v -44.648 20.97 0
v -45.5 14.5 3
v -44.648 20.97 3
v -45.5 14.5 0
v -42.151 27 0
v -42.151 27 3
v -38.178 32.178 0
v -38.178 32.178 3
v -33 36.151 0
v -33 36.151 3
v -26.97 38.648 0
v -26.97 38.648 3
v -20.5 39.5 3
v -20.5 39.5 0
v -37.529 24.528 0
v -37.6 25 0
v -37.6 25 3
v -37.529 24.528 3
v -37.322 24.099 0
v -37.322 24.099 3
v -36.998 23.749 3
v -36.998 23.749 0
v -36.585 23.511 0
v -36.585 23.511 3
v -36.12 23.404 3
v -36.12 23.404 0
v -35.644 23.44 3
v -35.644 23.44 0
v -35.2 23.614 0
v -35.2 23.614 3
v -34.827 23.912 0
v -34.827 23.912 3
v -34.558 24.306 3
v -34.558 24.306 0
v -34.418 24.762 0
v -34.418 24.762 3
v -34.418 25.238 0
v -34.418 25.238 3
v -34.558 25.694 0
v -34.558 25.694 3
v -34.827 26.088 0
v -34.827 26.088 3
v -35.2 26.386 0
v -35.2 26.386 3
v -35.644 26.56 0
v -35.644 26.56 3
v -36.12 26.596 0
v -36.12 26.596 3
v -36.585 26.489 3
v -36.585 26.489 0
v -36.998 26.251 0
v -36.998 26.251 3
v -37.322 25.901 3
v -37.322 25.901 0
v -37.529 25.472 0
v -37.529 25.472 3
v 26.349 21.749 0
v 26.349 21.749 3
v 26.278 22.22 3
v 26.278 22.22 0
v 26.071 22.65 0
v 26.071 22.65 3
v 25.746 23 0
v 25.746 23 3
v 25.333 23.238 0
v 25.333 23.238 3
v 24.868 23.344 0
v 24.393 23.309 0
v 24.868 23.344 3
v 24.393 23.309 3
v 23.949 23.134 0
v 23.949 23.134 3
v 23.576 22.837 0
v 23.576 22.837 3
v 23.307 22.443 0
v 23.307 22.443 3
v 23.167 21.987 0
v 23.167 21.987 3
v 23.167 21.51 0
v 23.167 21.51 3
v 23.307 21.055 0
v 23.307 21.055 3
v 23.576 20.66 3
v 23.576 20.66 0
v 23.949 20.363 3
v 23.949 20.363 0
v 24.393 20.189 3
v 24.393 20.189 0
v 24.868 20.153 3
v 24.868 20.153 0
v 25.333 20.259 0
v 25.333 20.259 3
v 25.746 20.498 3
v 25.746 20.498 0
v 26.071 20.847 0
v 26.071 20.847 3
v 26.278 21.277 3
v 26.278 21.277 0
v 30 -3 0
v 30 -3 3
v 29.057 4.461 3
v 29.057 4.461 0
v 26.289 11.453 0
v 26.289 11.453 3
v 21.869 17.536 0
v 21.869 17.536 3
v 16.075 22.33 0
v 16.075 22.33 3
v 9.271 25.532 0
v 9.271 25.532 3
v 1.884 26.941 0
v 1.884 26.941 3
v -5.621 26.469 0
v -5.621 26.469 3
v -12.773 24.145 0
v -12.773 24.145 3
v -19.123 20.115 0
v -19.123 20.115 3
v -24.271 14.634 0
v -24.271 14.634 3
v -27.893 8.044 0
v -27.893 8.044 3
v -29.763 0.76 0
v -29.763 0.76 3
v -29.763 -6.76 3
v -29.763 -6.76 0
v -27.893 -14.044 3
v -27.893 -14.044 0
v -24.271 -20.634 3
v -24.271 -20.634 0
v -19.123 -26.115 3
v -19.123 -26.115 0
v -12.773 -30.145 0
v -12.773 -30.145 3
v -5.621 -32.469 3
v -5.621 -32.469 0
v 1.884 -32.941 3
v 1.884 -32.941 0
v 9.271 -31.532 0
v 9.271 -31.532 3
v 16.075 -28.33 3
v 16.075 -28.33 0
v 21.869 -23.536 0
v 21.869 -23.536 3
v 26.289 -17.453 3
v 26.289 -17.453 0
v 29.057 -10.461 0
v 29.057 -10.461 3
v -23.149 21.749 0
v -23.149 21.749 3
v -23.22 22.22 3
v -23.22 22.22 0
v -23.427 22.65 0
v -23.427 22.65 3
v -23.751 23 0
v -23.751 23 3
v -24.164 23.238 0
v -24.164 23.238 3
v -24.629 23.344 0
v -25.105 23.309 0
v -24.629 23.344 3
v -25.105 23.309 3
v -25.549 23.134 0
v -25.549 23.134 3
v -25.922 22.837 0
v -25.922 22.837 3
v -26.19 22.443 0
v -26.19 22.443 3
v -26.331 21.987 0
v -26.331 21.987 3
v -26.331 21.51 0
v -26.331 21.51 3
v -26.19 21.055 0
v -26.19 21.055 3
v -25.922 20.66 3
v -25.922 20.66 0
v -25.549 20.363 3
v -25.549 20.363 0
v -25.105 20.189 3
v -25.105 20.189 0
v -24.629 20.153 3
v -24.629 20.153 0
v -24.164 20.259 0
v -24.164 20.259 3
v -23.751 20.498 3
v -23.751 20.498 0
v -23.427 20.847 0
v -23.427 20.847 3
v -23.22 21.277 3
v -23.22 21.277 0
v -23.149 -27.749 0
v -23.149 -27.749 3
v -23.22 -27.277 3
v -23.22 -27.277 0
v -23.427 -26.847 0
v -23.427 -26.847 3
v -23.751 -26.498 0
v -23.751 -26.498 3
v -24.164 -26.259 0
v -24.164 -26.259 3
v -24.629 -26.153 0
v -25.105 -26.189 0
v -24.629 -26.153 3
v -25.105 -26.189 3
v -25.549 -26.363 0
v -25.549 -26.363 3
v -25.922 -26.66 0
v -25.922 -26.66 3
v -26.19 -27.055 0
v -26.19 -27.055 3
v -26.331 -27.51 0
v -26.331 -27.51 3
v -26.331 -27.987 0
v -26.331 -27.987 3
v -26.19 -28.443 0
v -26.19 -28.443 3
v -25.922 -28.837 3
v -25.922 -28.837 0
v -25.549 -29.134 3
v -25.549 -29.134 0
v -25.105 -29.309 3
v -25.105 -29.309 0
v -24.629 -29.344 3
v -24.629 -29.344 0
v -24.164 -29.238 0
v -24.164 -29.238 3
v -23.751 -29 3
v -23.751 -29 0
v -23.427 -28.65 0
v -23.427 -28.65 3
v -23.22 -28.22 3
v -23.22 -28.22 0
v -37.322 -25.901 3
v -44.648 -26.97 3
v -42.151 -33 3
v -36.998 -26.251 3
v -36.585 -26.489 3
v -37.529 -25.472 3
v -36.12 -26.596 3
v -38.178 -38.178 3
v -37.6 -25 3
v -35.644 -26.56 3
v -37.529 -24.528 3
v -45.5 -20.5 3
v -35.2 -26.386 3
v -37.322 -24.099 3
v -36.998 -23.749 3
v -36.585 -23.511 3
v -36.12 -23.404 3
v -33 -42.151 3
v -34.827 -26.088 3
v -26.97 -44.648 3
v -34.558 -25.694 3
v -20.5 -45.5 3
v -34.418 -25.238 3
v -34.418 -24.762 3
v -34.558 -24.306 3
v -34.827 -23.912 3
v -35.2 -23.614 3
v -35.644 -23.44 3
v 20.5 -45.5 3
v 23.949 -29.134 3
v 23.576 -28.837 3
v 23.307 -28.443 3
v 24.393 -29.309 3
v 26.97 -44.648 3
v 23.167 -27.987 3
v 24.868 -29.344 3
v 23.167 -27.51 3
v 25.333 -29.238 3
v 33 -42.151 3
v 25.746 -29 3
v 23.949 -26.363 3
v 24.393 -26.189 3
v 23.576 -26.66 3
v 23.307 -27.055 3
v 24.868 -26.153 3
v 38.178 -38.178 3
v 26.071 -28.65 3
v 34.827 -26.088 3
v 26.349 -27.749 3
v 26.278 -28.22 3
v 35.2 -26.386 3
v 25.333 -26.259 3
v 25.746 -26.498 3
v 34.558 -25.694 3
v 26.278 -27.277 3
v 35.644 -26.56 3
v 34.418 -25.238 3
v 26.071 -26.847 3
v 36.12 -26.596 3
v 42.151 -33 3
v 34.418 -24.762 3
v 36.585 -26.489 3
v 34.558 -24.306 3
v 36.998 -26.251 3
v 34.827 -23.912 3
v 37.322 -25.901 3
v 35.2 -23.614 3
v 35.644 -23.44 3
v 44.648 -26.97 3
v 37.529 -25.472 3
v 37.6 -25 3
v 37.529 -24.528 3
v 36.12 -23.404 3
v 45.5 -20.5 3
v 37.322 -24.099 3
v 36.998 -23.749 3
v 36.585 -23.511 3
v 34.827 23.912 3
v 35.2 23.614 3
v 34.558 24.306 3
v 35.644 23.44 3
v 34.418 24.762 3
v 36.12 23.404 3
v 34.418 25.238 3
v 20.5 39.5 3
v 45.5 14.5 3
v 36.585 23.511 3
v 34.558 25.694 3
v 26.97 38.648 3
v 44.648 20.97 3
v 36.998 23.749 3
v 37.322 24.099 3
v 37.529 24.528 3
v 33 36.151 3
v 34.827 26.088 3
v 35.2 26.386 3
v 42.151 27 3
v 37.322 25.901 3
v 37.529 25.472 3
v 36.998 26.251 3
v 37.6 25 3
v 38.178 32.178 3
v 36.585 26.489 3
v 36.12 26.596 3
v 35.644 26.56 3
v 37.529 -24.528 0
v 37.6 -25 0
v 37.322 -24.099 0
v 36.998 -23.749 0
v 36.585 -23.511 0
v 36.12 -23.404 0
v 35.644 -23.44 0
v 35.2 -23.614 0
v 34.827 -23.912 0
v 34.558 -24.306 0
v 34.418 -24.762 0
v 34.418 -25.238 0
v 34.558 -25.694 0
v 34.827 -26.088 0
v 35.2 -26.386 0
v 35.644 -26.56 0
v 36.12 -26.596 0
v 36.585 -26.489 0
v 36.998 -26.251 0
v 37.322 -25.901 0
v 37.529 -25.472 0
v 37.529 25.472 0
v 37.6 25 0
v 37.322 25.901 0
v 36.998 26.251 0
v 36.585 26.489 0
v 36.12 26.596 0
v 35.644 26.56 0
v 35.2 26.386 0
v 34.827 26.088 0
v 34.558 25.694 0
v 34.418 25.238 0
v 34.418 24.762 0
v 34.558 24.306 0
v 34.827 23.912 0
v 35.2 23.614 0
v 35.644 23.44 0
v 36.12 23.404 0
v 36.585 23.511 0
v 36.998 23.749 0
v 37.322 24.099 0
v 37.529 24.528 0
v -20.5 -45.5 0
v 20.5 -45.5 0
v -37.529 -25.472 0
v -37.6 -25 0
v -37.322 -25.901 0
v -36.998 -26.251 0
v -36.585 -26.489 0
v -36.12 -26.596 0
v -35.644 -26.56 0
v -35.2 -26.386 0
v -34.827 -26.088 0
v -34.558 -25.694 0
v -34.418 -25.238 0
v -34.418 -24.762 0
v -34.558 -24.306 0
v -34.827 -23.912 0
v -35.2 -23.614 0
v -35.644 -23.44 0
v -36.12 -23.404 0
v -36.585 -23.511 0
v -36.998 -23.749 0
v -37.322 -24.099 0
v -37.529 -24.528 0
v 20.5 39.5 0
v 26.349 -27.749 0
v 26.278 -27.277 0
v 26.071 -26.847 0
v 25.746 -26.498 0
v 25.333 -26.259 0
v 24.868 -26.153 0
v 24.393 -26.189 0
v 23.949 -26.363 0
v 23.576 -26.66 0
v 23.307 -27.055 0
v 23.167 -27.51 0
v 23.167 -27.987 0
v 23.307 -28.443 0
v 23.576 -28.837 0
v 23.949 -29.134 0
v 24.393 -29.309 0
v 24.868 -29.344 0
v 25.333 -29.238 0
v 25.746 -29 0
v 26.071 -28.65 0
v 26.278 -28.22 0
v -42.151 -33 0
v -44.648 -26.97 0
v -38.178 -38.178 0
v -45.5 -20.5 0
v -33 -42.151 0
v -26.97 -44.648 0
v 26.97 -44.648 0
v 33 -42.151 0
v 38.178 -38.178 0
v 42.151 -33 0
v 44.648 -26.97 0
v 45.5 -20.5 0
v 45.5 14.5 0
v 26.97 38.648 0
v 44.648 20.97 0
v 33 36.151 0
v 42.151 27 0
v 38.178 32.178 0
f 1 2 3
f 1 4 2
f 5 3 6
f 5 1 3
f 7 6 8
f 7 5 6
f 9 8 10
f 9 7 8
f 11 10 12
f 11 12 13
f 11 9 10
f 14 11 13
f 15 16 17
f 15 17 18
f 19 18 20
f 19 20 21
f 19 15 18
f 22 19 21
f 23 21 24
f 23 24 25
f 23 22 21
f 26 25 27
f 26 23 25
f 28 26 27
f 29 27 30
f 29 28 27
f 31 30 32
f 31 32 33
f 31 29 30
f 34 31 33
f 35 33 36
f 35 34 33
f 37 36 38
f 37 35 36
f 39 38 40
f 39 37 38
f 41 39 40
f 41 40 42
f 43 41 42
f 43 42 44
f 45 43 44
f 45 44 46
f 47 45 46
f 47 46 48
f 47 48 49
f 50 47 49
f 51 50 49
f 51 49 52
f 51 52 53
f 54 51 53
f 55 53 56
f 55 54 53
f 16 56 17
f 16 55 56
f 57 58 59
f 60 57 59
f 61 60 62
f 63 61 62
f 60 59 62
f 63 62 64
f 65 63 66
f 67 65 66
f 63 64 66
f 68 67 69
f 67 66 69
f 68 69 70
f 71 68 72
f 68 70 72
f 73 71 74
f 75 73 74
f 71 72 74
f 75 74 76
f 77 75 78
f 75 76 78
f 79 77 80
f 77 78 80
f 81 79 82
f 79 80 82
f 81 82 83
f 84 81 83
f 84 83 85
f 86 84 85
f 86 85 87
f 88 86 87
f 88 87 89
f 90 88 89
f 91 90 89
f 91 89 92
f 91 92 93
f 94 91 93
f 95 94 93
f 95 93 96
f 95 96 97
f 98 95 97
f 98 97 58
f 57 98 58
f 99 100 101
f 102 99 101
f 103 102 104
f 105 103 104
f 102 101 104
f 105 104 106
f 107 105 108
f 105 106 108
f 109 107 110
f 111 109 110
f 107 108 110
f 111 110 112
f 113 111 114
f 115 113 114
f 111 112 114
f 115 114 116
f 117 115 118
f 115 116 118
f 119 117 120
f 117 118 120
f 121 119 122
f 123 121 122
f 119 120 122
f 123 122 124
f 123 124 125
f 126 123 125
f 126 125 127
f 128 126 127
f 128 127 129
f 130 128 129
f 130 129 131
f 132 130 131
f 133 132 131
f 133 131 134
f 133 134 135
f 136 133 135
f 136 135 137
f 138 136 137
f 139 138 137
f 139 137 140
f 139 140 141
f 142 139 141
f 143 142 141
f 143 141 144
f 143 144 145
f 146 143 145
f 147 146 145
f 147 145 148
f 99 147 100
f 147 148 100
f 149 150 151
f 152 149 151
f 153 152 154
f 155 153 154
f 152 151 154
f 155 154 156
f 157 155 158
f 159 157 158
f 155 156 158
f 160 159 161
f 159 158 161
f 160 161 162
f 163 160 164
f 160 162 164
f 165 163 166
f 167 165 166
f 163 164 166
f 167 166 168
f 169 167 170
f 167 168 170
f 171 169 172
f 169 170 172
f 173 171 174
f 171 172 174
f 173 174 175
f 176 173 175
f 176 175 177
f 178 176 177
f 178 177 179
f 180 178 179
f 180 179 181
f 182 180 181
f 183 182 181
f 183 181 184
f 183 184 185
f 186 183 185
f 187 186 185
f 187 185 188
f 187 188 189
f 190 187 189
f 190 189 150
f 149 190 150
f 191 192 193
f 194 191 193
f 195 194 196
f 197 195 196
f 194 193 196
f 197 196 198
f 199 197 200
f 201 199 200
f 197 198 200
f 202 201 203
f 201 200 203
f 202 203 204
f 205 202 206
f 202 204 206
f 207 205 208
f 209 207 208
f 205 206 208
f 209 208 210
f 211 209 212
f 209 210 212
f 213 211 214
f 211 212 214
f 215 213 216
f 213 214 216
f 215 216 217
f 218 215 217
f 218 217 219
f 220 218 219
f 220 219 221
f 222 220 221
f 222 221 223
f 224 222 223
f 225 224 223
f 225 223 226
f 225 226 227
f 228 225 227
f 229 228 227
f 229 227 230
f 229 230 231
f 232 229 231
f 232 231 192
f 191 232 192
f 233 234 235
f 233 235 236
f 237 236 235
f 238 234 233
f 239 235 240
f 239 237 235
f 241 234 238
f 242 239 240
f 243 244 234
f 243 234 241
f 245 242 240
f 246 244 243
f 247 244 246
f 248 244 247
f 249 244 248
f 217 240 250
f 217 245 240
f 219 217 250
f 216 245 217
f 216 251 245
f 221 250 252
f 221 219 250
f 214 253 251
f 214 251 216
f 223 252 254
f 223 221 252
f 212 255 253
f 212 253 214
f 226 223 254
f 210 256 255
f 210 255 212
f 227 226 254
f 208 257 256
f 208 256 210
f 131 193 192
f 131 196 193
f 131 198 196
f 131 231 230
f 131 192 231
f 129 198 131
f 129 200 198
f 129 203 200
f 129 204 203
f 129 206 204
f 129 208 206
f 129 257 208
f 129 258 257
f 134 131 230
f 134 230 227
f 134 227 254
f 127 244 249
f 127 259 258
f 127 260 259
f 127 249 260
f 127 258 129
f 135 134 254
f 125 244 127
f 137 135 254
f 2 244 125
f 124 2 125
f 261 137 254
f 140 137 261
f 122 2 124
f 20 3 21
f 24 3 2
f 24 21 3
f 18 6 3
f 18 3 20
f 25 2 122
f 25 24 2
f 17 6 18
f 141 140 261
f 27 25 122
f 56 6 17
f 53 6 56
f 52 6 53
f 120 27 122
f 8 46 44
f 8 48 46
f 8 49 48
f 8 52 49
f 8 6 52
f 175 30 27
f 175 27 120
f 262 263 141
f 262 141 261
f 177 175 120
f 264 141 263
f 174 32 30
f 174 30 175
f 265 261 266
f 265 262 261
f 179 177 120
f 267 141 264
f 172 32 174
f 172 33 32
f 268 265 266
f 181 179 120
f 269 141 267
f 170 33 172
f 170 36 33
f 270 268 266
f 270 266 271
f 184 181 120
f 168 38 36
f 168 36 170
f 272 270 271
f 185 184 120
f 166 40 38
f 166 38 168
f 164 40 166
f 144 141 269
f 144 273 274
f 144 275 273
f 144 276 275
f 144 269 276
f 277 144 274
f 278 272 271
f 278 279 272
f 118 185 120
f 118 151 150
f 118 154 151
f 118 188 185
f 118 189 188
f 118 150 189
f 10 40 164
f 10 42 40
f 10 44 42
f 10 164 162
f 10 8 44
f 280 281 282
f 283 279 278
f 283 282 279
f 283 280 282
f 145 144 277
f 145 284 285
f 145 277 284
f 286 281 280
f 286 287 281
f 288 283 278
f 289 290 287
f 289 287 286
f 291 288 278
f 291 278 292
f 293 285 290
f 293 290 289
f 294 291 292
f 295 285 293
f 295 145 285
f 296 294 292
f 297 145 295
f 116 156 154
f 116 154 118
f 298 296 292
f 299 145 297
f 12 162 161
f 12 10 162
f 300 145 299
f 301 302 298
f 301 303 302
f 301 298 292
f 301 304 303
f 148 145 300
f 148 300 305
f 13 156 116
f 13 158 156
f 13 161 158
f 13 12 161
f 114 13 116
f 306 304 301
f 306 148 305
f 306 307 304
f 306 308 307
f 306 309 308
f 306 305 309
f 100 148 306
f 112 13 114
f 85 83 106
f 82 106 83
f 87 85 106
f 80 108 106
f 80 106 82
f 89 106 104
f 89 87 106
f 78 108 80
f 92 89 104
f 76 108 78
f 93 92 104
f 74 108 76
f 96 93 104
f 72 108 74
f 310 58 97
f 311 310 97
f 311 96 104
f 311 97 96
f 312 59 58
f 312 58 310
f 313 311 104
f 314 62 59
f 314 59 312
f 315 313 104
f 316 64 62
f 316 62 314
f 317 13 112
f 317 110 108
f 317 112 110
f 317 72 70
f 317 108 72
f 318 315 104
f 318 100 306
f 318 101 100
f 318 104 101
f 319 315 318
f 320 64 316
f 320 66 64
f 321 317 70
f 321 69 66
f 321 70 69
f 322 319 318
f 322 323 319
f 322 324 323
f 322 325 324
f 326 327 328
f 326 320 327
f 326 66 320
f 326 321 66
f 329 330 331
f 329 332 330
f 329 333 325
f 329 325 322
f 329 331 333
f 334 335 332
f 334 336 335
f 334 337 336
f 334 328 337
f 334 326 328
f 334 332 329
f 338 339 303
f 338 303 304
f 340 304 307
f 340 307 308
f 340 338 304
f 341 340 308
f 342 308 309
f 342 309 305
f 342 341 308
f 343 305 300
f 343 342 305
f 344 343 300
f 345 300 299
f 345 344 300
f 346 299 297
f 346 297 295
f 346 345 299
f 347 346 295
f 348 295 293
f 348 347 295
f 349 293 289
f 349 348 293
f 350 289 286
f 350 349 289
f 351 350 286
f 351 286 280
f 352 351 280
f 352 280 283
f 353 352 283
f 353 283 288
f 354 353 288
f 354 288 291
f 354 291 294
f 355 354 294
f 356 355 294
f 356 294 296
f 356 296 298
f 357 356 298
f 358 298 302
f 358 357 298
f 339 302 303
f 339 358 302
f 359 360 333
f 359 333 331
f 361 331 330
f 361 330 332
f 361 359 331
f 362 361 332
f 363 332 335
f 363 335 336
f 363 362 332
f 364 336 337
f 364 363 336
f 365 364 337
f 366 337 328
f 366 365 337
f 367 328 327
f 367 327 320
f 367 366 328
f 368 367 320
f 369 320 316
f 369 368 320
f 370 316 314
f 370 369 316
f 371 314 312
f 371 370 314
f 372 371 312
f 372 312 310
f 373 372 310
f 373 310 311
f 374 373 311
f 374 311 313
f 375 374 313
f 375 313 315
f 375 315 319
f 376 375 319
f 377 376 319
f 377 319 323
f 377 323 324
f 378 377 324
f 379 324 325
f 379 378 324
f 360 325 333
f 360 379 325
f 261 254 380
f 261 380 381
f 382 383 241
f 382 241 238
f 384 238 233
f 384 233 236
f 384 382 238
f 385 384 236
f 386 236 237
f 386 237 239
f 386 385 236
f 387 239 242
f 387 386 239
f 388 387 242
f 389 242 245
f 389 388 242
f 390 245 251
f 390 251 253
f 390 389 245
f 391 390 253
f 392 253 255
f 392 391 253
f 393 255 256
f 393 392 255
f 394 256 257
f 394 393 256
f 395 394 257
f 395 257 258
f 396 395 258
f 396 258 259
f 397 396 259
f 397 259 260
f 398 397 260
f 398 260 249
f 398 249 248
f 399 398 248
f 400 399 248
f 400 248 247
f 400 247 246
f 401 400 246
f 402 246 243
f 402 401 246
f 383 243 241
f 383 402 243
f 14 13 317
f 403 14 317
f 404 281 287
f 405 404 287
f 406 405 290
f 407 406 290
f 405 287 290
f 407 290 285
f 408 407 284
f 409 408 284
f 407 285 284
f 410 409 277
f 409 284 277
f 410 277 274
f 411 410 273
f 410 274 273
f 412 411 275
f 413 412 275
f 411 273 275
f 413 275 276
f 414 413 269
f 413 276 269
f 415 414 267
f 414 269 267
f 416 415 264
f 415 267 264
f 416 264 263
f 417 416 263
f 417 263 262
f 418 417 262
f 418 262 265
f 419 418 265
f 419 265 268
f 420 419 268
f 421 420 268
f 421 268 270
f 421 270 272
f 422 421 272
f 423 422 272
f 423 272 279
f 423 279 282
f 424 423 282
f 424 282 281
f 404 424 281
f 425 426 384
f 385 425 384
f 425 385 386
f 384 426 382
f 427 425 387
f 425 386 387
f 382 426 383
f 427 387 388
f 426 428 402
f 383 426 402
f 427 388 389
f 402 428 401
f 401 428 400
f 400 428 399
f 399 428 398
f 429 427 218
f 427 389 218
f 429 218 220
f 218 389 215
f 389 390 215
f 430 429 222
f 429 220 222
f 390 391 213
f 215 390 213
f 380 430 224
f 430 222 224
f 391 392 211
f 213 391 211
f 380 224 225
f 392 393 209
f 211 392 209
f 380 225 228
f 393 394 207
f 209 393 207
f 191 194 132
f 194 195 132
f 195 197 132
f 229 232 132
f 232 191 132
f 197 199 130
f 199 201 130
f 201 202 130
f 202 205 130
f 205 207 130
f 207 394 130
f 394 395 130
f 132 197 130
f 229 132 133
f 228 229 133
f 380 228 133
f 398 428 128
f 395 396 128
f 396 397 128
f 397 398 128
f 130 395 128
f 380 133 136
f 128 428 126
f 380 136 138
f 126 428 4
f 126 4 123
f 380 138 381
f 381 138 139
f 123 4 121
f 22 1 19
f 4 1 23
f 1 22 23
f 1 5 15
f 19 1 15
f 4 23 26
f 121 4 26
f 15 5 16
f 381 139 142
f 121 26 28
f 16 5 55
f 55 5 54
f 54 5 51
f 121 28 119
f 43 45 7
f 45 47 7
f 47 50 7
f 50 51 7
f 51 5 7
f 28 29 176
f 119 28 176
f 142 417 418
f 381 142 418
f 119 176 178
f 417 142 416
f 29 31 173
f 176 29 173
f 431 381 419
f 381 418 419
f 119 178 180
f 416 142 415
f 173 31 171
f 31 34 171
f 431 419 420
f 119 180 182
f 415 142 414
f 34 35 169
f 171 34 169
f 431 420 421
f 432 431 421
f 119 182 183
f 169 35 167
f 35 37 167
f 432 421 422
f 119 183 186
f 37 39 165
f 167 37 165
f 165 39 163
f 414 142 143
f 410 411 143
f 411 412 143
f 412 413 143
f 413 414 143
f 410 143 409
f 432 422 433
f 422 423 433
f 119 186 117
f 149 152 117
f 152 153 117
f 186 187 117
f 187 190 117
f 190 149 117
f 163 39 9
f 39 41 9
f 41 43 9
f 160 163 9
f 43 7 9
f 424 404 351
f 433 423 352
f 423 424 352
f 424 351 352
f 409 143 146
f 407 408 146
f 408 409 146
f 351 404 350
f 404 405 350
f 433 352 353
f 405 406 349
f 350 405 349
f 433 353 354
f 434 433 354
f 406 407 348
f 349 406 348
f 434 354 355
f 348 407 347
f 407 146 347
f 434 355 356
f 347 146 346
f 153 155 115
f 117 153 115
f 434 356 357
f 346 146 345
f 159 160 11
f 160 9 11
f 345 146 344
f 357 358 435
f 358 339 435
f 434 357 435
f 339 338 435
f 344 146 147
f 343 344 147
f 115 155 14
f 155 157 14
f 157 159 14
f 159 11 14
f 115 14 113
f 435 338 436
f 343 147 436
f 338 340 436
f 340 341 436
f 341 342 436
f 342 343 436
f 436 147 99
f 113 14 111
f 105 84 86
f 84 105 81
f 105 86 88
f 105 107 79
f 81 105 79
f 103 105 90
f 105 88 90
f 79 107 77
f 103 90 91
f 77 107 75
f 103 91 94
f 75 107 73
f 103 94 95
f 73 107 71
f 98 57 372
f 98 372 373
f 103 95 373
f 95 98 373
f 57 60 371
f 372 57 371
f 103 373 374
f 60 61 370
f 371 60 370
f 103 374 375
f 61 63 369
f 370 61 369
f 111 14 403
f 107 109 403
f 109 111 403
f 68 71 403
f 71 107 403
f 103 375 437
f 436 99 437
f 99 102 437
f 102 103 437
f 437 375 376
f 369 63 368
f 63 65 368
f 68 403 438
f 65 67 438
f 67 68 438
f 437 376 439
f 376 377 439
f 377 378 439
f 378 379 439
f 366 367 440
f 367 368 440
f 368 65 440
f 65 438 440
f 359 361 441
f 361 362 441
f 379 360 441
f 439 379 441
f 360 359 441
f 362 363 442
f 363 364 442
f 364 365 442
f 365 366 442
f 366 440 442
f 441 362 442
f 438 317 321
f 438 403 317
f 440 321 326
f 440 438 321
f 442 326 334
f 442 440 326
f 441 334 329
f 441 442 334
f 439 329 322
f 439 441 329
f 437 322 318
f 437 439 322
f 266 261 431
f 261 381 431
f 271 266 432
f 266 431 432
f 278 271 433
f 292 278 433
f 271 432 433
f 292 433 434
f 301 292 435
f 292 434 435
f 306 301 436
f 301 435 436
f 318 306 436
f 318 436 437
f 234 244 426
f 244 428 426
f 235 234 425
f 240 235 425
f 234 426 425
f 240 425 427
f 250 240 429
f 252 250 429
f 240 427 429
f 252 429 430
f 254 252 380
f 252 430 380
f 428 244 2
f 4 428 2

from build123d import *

# Parameters (mm, degrees)
SKETCH_1_W          = 91
SKETCH_1_H          = 74
SKETCH_1_R          = 1.6
EXTRUDE_1_DEPTH     = 3
SKETCH_2_R          = 30
SKETCH_2_R_2        = 1.6
CUT_EXTRUDE_1_DEPTH = 10
SKETCH_3_W          = 91
SKETCH_3_H          = 6
CUT_EXTRUDE_2_DEPTH = 10
SKETCH_4_W          = 91
SKETCH_4_H          = 8.5
SKETCH_4_H_2        = 14.5
EXTRUDE_2_DEPTH     = 3
SKETCH_5_W          = 91
SKETCH_5_H          = 6
CUT_EXTRUDE_3_DEPTH = 3
FILLET_4_R          = 25


with BuildPart() as part:
    # 草图1 → 凸台-拉伸1 (new body)
    with BuildSketch(Plane.XY):
        Rectangle(SKETCH_1_W, SKETCH_1_H)
        with Locations((36, -25)):
            Circle(SKETCH_1_R, mode=Mode.SUBTRACT)
        with Locations((36, 25)):
            Circle(SKETCH_1_R, mode=Mode.SUBTRACT)
        with Locations(Location((-36, 25, 0), (0, 0, 180))):
            Circle(SKETCH_1_R, mode=Mode.SUBTRACT)
        with Locations(Location((-36, -25, 0), (0, 0, 180))):
            Circle(SKETCH_1_R, mode=Mode.SUBTRACT)
    extrude(amount=EXTRUDE_1_DEPTH)

    # 草图2 → 切除-拉伸1 (cut)
    with BuildSketch(Plane.XY.offset(3)):
        with Locations((0, -3)):
            Circle(SKETCH_2_R)
        with Locations((24.748737342, -27.748737342)):
            Circle(SKETCH_2_R_2)
        with Locations((24.748737342, 21.748737342)):
            Circle(SKETCH_2_R_2)
        with Locations((-24.748737342, -27.748737342)):
            Circle(SKETCH_2_R_2)
        with Locations((-24.748737342, 21.748737342)):
            Circle(SKETCH_2_R_2)
    extrude(amount=-CUT_EXTRUDE_1_DEPTH, mode=Mode.SUBTRACT)

    # 草图3 → 切除-拉伸2 (cut)
    with BuildSketch(Plane.XY.offset(3)):
        with Locations((0, 34)):
            Rectangle(SKETCH_3_W, SKETCH_3_H)
    extrude(amount=-CUT_EXTRUDE_2_DEPTH, mode=Mode.SUBTRACT)

    # 草图4 → 凸台-拉伸2 (add)
    with BuildSketch(Plane.XY.offset(3)):
        with Locations((0, -41.25)):
            Rectangle(SKETCH_4_W, SKETCH_4_H)
        with Locations((0, 38.25)):
            Rectangle(SKETCH_4_W, SKETCH_4_H_2)
    extrude(amount=-EXTRUDE_2_DEPTH)

    # 草图5 → 切除-拉伸3 (cut)
    with BuildSketch(Plane.XY.offset(3)):
        with Locations((0, 42.5)):
            Rectangle(SKETCH_5_W, SKETCH_5_H)
    extrude(amount=-CUT_EXTRUDE_3_DEPTH, mode=Mode.SUBTRACT)

    # 圆角4
    fillet_4_edges = [part.edges().sort_by_distance(p)[0] for p in [
        (-45.5, 39.5, 1.5),
        (45.5, 39.5, 1.5),
        (-45.5, -45.5, 1.5),
        (45.5, -45.5, 1.5),
    ]]
    fillet(fillet_4_edges, radius=FILLET_4_R)


solid = part.part
